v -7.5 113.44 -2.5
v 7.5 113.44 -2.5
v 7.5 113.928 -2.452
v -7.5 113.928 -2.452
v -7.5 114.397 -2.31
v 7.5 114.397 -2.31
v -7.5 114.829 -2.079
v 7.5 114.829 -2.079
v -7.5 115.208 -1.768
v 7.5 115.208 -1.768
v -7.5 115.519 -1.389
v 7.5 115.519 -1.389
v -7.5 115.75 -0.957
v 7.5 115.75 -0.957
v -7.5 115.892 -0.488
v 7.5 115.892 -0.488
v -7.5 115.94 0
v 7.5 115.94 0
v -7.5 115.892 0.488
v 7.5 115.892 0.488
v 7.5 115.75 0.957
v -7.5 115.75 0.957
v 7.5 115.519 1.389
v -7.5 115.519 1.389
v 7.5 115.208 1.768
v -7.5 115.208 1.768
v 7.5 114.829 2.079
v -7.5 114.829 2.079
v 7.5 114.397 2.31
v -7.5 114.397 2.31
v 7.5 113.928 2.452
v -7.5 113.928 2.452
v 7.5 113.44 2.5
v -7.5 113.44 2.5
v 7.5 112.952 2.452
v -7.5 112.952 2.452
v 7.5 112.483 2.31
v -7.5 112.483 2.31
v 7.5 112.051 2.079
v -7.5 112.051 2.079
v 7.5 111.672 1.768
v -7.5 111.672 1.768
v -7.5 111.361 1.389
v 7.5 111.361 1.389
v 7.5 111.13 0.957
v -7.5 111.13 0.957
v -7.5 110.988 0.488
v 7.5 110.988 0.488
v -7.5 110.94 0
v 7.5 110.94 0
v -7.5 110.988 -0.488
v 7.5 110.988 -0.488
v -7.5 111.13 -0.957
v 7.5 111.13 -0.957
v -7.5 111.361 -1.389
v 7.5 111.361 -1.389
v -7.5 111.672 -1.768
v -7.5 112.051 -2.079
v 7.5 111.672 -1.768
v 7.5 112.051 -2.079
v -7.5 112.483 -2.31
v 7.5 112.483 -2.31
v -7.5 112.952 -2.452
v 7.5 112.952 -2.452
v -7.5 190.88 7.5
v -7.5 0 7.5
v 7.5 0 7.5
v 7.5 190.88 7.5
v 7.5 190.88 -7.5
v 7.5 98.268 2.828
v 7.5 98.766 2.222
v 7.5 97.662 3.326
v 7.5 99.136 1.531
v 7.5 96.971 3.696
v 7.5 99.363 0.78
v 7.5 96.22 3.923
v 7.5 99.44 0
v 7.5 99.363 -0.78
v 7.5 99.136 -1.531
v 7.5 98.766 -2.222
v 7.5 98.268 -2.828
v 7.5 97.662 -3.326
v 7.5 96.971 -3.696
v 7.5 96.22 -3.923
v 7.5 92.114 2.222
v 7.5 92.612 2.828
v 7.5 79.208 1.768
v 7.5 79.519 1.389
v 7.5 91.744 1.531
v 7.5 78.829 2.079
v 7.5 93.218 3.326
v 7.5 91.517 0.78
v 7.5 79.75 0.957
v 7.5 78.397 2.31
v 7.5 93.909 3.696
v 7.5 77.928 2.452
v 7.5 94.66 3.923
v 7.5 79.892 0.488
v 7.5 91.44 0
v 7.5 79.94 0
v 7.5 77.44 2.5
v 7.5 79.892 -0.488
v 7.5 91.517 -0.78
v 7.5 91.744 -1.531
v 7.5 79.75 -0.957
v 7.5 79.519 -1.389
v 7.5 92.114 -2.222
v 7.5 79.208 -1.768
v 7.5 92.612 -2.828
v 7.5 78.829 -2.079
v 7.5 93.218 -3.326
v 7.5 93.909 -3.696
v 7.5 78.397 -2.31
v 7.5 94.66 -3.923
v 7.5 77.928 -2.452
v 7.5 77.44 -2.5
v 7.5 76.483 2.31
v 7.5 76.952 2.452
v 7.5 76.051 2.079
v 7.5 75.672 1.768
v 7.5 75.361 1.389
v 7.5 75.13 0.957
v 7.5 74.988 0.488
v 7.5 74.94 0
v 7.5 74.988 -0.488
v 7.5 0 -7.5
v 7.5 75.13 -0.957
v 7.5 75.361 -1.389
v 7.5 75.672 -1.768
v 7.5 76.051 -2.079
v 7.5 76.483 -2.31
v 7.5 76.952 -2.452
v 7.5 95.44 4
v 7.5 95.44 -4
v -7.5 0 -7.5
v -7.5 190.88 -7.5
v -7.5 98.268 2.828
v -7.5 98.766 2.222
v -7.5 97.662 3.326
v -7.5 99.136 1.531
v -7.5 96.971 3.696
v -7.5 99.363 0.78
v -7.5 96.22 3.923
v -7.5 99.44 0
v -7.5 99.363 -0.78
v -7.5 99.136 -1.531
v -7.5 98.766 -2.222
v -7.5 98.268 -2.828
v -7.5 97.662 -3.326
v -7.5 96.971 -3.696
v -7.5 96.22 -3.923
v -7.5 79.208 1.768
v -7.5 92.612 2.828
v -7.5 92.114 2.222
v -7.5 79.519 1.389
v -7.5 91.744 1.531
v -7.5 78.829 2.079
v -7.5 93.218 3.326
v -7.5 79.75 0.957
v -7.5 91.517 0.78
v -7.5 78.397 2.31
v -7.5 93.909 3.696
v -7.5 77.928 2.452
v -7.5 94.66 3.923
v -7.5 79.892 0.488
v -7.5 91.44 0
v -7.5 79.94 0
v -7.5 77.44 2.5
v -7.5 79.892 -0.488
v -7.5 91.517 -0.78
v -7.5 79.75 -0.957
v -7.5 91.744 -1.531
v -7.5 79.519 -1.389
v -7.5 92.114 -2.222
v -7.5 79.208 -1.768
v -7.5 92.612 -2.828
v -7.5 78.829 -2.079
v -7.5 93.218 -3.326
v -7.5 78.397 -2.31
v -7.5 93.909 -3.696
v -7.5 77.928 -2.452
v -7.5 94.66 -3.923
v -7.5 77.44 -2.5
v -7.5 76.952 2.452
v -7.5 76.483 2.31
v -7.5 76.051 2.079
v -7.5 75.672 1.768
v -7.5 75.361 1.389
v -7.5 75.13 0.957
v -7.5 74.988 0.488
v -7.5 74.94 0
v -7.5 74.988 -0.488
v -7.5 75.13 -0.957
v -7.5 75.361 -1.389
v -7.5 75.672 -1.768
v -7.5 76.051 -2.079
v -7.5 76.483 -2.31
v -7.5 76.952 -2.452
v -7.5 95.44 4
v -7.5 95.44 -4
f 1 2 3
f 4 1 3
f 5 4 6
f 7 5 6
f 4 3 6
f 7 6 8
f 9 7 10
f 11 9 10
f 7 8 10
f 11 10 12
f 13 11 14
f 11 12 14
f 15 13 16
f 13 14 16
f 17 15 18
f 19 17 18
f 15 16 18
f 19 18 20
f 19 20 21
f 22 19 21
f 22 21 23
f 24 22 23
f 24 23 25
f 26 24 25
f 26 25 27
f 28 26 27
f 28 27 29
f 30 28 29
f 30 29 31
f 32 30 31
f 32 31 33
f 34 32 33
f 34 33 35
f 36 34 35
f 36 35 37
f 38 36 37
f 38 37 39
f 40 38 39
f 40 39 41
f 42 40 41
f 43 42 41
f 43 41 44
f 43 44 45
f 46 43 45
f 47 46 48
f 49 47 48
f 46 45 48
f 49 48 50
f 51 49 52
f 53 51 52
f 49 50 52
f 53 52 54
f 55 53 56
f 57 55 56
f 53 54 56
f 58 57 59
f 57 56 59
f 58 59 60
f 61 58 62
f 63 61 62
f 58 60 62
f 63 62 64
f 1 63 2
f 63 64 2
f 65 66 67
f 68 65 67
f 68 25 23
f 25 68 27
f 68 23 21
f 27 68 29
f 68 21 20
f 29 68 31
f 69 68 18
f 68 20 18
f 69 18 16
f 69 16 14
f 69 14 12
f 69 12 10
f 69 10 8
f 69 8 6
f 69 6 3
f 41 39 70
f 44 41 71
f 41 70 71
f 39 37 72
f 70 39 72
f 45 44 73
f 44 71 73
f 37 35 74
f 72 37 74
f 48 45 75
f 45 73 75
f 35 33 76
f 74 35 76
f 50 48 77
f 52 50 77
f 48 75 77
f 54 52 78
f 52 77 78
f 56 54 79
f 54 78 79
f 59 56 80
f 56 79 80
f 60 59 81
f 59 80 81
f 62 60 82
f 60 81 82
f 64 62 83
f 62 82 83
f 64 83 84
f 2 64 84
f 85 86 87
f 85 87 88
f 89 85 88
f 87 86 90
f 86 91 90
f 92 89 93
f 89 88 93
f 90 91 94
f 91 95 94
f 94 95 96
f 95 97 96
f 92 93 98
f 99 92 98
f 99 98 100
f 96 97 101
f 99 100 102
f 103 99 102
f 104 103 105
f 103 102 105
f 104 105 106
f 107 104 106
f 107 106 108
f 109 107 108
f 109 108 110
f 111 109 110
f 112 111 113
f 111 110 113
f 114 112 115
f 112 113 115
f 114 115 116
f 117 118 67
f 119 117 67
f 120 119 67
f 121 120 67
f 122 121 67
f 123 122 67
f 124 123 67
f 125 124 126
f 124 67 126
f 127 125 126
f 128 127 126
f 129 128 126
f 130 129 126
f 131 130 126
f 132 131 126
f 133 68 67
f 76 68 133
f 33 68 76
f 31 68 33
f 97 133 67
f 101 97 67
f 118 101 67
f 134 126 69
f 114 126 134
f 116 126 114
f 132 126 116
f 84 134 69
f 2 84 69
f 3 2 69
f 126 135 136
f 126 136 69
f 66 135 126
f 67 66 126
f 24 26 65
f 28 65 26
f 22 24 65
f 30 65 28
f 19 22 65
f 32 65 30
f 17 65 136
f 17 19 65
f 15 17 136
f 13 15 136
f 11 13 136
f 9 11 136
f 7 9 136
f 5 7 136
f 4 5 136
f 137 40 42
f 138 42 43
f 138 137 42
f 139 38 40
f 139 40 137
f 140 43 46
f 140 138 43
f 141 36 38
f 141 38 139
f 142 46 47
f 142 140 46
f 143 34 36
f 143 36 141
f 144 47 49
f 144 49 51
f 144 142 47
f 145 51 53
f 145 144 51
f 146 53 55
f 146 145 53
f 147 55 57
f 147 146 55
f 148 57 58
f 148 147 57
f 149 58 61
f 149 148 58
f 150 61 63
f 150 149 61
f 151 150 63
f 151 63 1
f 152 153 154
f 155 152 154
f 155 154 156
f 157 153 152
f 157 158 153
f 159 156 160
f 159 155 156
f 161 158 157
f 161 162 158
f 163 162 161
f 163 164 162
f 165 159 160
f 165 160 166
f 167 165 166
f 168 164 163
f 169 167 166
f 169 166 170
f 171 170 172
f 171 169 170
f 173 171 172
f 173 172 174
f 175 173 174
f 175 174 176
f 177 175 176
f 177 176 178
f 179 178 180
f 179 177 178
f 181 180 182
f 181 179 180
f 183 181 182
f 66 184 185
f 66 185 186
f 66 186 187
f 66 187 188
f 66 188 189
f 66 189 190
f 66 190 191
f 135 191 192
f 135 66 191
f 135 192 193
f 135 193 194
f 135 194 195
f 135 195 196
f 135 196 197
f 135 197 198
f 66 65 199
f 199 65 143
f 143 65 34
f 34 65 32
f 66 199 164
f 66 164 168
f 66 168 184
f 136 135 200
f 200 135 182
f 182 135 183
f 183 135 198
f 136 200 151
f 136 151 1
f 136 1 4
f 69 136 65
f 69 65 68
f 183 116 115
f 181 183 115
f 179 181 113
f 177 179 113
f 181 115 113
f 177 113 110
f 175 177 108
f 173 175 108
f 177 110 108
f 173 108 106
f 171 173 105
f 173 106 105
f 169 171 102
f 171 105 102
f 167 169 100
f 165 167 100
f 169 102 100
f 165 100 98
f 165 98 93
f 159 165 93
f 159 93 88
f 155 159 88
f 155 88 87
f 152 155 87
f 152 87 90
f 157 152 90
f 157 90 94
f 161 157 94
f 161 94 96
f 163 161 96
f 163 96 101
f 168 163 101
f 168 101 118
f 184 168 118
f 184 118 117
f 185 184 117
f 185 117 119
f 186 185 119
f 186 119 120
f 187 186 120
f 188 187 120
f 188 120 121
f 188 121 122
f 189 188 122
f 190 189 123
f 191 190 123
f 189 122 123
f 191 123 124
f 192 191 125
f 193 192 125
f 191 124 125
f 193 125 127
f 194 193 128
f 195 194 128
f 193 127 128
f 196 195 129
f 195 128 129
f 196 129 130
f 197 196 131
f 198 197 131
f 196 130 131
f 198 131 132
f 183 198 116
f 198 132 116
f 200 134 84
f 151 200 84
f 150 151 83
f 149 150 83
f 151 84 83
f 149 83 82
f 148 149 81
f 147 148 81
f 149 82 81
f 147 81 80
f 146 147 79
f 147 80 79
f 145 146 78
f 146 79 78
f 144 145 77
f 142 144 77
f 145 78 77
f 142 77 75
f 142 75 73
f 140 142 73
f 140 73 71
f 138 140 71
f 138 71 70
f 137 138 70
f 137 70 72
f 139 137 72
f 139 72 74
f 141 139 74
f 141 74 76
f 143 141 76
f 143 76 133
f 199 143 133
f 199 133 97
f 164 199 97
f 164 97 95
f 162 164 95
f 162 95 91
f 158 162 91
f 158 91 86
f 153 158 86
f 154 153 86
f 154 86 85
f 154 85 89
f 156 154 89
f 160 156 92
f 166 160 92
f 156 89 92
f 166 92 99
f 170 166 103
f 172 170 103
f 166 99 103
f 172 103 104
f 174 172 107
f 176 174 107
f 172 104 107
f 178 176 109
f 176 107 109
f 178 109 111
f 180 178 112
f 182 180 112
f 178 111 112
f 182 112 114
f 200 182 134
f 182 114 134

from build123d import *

# Parameters (mm, degrees)
SKETCH_1_W          = 15
SKETCH_1_H          = 15
EXTRUDE_1_DEPTH     = 190.88
SKETCH_2_R          = 4
SKETCH_2_R_2        = 2.5
CUT_EXTRUDE_1_DEPTH = 192.615303147


with BuildPart() as part:
    # 草图1 → 凸台-拉伸1 (new body)
    with BuildSketch(Plane(origin=(0, 0, 0), x_dir=(1, 0, 0), z_dir=(0, 1, 0))):
        Rectangle(SKETCH_1_W, SKETCH_1_H)
    extrude(amount=EXTRUDE_1_DEPTH)

    # 草图2 → 切除-拉伸1 (cut, through all)
    with BuildSketch(Plane(origin=(7.5, 0, 0), x_dir=(0, 0, -1), z_dir=(1, 0, 0))):
        with Locations((0, 95.44)):
            Circle(SKETCH_2_R)
        with Locations((0, 113.44)):
            Circle(SKETCH_2_R_2)
        with Locations((0, 77.44)):
            Circle(SKETCH_2_R_2)
    extrude(amount=-CUT_EXTRUDE_1_DEPTH, mode=Mode.SUBTRACT)


solid = part.part
